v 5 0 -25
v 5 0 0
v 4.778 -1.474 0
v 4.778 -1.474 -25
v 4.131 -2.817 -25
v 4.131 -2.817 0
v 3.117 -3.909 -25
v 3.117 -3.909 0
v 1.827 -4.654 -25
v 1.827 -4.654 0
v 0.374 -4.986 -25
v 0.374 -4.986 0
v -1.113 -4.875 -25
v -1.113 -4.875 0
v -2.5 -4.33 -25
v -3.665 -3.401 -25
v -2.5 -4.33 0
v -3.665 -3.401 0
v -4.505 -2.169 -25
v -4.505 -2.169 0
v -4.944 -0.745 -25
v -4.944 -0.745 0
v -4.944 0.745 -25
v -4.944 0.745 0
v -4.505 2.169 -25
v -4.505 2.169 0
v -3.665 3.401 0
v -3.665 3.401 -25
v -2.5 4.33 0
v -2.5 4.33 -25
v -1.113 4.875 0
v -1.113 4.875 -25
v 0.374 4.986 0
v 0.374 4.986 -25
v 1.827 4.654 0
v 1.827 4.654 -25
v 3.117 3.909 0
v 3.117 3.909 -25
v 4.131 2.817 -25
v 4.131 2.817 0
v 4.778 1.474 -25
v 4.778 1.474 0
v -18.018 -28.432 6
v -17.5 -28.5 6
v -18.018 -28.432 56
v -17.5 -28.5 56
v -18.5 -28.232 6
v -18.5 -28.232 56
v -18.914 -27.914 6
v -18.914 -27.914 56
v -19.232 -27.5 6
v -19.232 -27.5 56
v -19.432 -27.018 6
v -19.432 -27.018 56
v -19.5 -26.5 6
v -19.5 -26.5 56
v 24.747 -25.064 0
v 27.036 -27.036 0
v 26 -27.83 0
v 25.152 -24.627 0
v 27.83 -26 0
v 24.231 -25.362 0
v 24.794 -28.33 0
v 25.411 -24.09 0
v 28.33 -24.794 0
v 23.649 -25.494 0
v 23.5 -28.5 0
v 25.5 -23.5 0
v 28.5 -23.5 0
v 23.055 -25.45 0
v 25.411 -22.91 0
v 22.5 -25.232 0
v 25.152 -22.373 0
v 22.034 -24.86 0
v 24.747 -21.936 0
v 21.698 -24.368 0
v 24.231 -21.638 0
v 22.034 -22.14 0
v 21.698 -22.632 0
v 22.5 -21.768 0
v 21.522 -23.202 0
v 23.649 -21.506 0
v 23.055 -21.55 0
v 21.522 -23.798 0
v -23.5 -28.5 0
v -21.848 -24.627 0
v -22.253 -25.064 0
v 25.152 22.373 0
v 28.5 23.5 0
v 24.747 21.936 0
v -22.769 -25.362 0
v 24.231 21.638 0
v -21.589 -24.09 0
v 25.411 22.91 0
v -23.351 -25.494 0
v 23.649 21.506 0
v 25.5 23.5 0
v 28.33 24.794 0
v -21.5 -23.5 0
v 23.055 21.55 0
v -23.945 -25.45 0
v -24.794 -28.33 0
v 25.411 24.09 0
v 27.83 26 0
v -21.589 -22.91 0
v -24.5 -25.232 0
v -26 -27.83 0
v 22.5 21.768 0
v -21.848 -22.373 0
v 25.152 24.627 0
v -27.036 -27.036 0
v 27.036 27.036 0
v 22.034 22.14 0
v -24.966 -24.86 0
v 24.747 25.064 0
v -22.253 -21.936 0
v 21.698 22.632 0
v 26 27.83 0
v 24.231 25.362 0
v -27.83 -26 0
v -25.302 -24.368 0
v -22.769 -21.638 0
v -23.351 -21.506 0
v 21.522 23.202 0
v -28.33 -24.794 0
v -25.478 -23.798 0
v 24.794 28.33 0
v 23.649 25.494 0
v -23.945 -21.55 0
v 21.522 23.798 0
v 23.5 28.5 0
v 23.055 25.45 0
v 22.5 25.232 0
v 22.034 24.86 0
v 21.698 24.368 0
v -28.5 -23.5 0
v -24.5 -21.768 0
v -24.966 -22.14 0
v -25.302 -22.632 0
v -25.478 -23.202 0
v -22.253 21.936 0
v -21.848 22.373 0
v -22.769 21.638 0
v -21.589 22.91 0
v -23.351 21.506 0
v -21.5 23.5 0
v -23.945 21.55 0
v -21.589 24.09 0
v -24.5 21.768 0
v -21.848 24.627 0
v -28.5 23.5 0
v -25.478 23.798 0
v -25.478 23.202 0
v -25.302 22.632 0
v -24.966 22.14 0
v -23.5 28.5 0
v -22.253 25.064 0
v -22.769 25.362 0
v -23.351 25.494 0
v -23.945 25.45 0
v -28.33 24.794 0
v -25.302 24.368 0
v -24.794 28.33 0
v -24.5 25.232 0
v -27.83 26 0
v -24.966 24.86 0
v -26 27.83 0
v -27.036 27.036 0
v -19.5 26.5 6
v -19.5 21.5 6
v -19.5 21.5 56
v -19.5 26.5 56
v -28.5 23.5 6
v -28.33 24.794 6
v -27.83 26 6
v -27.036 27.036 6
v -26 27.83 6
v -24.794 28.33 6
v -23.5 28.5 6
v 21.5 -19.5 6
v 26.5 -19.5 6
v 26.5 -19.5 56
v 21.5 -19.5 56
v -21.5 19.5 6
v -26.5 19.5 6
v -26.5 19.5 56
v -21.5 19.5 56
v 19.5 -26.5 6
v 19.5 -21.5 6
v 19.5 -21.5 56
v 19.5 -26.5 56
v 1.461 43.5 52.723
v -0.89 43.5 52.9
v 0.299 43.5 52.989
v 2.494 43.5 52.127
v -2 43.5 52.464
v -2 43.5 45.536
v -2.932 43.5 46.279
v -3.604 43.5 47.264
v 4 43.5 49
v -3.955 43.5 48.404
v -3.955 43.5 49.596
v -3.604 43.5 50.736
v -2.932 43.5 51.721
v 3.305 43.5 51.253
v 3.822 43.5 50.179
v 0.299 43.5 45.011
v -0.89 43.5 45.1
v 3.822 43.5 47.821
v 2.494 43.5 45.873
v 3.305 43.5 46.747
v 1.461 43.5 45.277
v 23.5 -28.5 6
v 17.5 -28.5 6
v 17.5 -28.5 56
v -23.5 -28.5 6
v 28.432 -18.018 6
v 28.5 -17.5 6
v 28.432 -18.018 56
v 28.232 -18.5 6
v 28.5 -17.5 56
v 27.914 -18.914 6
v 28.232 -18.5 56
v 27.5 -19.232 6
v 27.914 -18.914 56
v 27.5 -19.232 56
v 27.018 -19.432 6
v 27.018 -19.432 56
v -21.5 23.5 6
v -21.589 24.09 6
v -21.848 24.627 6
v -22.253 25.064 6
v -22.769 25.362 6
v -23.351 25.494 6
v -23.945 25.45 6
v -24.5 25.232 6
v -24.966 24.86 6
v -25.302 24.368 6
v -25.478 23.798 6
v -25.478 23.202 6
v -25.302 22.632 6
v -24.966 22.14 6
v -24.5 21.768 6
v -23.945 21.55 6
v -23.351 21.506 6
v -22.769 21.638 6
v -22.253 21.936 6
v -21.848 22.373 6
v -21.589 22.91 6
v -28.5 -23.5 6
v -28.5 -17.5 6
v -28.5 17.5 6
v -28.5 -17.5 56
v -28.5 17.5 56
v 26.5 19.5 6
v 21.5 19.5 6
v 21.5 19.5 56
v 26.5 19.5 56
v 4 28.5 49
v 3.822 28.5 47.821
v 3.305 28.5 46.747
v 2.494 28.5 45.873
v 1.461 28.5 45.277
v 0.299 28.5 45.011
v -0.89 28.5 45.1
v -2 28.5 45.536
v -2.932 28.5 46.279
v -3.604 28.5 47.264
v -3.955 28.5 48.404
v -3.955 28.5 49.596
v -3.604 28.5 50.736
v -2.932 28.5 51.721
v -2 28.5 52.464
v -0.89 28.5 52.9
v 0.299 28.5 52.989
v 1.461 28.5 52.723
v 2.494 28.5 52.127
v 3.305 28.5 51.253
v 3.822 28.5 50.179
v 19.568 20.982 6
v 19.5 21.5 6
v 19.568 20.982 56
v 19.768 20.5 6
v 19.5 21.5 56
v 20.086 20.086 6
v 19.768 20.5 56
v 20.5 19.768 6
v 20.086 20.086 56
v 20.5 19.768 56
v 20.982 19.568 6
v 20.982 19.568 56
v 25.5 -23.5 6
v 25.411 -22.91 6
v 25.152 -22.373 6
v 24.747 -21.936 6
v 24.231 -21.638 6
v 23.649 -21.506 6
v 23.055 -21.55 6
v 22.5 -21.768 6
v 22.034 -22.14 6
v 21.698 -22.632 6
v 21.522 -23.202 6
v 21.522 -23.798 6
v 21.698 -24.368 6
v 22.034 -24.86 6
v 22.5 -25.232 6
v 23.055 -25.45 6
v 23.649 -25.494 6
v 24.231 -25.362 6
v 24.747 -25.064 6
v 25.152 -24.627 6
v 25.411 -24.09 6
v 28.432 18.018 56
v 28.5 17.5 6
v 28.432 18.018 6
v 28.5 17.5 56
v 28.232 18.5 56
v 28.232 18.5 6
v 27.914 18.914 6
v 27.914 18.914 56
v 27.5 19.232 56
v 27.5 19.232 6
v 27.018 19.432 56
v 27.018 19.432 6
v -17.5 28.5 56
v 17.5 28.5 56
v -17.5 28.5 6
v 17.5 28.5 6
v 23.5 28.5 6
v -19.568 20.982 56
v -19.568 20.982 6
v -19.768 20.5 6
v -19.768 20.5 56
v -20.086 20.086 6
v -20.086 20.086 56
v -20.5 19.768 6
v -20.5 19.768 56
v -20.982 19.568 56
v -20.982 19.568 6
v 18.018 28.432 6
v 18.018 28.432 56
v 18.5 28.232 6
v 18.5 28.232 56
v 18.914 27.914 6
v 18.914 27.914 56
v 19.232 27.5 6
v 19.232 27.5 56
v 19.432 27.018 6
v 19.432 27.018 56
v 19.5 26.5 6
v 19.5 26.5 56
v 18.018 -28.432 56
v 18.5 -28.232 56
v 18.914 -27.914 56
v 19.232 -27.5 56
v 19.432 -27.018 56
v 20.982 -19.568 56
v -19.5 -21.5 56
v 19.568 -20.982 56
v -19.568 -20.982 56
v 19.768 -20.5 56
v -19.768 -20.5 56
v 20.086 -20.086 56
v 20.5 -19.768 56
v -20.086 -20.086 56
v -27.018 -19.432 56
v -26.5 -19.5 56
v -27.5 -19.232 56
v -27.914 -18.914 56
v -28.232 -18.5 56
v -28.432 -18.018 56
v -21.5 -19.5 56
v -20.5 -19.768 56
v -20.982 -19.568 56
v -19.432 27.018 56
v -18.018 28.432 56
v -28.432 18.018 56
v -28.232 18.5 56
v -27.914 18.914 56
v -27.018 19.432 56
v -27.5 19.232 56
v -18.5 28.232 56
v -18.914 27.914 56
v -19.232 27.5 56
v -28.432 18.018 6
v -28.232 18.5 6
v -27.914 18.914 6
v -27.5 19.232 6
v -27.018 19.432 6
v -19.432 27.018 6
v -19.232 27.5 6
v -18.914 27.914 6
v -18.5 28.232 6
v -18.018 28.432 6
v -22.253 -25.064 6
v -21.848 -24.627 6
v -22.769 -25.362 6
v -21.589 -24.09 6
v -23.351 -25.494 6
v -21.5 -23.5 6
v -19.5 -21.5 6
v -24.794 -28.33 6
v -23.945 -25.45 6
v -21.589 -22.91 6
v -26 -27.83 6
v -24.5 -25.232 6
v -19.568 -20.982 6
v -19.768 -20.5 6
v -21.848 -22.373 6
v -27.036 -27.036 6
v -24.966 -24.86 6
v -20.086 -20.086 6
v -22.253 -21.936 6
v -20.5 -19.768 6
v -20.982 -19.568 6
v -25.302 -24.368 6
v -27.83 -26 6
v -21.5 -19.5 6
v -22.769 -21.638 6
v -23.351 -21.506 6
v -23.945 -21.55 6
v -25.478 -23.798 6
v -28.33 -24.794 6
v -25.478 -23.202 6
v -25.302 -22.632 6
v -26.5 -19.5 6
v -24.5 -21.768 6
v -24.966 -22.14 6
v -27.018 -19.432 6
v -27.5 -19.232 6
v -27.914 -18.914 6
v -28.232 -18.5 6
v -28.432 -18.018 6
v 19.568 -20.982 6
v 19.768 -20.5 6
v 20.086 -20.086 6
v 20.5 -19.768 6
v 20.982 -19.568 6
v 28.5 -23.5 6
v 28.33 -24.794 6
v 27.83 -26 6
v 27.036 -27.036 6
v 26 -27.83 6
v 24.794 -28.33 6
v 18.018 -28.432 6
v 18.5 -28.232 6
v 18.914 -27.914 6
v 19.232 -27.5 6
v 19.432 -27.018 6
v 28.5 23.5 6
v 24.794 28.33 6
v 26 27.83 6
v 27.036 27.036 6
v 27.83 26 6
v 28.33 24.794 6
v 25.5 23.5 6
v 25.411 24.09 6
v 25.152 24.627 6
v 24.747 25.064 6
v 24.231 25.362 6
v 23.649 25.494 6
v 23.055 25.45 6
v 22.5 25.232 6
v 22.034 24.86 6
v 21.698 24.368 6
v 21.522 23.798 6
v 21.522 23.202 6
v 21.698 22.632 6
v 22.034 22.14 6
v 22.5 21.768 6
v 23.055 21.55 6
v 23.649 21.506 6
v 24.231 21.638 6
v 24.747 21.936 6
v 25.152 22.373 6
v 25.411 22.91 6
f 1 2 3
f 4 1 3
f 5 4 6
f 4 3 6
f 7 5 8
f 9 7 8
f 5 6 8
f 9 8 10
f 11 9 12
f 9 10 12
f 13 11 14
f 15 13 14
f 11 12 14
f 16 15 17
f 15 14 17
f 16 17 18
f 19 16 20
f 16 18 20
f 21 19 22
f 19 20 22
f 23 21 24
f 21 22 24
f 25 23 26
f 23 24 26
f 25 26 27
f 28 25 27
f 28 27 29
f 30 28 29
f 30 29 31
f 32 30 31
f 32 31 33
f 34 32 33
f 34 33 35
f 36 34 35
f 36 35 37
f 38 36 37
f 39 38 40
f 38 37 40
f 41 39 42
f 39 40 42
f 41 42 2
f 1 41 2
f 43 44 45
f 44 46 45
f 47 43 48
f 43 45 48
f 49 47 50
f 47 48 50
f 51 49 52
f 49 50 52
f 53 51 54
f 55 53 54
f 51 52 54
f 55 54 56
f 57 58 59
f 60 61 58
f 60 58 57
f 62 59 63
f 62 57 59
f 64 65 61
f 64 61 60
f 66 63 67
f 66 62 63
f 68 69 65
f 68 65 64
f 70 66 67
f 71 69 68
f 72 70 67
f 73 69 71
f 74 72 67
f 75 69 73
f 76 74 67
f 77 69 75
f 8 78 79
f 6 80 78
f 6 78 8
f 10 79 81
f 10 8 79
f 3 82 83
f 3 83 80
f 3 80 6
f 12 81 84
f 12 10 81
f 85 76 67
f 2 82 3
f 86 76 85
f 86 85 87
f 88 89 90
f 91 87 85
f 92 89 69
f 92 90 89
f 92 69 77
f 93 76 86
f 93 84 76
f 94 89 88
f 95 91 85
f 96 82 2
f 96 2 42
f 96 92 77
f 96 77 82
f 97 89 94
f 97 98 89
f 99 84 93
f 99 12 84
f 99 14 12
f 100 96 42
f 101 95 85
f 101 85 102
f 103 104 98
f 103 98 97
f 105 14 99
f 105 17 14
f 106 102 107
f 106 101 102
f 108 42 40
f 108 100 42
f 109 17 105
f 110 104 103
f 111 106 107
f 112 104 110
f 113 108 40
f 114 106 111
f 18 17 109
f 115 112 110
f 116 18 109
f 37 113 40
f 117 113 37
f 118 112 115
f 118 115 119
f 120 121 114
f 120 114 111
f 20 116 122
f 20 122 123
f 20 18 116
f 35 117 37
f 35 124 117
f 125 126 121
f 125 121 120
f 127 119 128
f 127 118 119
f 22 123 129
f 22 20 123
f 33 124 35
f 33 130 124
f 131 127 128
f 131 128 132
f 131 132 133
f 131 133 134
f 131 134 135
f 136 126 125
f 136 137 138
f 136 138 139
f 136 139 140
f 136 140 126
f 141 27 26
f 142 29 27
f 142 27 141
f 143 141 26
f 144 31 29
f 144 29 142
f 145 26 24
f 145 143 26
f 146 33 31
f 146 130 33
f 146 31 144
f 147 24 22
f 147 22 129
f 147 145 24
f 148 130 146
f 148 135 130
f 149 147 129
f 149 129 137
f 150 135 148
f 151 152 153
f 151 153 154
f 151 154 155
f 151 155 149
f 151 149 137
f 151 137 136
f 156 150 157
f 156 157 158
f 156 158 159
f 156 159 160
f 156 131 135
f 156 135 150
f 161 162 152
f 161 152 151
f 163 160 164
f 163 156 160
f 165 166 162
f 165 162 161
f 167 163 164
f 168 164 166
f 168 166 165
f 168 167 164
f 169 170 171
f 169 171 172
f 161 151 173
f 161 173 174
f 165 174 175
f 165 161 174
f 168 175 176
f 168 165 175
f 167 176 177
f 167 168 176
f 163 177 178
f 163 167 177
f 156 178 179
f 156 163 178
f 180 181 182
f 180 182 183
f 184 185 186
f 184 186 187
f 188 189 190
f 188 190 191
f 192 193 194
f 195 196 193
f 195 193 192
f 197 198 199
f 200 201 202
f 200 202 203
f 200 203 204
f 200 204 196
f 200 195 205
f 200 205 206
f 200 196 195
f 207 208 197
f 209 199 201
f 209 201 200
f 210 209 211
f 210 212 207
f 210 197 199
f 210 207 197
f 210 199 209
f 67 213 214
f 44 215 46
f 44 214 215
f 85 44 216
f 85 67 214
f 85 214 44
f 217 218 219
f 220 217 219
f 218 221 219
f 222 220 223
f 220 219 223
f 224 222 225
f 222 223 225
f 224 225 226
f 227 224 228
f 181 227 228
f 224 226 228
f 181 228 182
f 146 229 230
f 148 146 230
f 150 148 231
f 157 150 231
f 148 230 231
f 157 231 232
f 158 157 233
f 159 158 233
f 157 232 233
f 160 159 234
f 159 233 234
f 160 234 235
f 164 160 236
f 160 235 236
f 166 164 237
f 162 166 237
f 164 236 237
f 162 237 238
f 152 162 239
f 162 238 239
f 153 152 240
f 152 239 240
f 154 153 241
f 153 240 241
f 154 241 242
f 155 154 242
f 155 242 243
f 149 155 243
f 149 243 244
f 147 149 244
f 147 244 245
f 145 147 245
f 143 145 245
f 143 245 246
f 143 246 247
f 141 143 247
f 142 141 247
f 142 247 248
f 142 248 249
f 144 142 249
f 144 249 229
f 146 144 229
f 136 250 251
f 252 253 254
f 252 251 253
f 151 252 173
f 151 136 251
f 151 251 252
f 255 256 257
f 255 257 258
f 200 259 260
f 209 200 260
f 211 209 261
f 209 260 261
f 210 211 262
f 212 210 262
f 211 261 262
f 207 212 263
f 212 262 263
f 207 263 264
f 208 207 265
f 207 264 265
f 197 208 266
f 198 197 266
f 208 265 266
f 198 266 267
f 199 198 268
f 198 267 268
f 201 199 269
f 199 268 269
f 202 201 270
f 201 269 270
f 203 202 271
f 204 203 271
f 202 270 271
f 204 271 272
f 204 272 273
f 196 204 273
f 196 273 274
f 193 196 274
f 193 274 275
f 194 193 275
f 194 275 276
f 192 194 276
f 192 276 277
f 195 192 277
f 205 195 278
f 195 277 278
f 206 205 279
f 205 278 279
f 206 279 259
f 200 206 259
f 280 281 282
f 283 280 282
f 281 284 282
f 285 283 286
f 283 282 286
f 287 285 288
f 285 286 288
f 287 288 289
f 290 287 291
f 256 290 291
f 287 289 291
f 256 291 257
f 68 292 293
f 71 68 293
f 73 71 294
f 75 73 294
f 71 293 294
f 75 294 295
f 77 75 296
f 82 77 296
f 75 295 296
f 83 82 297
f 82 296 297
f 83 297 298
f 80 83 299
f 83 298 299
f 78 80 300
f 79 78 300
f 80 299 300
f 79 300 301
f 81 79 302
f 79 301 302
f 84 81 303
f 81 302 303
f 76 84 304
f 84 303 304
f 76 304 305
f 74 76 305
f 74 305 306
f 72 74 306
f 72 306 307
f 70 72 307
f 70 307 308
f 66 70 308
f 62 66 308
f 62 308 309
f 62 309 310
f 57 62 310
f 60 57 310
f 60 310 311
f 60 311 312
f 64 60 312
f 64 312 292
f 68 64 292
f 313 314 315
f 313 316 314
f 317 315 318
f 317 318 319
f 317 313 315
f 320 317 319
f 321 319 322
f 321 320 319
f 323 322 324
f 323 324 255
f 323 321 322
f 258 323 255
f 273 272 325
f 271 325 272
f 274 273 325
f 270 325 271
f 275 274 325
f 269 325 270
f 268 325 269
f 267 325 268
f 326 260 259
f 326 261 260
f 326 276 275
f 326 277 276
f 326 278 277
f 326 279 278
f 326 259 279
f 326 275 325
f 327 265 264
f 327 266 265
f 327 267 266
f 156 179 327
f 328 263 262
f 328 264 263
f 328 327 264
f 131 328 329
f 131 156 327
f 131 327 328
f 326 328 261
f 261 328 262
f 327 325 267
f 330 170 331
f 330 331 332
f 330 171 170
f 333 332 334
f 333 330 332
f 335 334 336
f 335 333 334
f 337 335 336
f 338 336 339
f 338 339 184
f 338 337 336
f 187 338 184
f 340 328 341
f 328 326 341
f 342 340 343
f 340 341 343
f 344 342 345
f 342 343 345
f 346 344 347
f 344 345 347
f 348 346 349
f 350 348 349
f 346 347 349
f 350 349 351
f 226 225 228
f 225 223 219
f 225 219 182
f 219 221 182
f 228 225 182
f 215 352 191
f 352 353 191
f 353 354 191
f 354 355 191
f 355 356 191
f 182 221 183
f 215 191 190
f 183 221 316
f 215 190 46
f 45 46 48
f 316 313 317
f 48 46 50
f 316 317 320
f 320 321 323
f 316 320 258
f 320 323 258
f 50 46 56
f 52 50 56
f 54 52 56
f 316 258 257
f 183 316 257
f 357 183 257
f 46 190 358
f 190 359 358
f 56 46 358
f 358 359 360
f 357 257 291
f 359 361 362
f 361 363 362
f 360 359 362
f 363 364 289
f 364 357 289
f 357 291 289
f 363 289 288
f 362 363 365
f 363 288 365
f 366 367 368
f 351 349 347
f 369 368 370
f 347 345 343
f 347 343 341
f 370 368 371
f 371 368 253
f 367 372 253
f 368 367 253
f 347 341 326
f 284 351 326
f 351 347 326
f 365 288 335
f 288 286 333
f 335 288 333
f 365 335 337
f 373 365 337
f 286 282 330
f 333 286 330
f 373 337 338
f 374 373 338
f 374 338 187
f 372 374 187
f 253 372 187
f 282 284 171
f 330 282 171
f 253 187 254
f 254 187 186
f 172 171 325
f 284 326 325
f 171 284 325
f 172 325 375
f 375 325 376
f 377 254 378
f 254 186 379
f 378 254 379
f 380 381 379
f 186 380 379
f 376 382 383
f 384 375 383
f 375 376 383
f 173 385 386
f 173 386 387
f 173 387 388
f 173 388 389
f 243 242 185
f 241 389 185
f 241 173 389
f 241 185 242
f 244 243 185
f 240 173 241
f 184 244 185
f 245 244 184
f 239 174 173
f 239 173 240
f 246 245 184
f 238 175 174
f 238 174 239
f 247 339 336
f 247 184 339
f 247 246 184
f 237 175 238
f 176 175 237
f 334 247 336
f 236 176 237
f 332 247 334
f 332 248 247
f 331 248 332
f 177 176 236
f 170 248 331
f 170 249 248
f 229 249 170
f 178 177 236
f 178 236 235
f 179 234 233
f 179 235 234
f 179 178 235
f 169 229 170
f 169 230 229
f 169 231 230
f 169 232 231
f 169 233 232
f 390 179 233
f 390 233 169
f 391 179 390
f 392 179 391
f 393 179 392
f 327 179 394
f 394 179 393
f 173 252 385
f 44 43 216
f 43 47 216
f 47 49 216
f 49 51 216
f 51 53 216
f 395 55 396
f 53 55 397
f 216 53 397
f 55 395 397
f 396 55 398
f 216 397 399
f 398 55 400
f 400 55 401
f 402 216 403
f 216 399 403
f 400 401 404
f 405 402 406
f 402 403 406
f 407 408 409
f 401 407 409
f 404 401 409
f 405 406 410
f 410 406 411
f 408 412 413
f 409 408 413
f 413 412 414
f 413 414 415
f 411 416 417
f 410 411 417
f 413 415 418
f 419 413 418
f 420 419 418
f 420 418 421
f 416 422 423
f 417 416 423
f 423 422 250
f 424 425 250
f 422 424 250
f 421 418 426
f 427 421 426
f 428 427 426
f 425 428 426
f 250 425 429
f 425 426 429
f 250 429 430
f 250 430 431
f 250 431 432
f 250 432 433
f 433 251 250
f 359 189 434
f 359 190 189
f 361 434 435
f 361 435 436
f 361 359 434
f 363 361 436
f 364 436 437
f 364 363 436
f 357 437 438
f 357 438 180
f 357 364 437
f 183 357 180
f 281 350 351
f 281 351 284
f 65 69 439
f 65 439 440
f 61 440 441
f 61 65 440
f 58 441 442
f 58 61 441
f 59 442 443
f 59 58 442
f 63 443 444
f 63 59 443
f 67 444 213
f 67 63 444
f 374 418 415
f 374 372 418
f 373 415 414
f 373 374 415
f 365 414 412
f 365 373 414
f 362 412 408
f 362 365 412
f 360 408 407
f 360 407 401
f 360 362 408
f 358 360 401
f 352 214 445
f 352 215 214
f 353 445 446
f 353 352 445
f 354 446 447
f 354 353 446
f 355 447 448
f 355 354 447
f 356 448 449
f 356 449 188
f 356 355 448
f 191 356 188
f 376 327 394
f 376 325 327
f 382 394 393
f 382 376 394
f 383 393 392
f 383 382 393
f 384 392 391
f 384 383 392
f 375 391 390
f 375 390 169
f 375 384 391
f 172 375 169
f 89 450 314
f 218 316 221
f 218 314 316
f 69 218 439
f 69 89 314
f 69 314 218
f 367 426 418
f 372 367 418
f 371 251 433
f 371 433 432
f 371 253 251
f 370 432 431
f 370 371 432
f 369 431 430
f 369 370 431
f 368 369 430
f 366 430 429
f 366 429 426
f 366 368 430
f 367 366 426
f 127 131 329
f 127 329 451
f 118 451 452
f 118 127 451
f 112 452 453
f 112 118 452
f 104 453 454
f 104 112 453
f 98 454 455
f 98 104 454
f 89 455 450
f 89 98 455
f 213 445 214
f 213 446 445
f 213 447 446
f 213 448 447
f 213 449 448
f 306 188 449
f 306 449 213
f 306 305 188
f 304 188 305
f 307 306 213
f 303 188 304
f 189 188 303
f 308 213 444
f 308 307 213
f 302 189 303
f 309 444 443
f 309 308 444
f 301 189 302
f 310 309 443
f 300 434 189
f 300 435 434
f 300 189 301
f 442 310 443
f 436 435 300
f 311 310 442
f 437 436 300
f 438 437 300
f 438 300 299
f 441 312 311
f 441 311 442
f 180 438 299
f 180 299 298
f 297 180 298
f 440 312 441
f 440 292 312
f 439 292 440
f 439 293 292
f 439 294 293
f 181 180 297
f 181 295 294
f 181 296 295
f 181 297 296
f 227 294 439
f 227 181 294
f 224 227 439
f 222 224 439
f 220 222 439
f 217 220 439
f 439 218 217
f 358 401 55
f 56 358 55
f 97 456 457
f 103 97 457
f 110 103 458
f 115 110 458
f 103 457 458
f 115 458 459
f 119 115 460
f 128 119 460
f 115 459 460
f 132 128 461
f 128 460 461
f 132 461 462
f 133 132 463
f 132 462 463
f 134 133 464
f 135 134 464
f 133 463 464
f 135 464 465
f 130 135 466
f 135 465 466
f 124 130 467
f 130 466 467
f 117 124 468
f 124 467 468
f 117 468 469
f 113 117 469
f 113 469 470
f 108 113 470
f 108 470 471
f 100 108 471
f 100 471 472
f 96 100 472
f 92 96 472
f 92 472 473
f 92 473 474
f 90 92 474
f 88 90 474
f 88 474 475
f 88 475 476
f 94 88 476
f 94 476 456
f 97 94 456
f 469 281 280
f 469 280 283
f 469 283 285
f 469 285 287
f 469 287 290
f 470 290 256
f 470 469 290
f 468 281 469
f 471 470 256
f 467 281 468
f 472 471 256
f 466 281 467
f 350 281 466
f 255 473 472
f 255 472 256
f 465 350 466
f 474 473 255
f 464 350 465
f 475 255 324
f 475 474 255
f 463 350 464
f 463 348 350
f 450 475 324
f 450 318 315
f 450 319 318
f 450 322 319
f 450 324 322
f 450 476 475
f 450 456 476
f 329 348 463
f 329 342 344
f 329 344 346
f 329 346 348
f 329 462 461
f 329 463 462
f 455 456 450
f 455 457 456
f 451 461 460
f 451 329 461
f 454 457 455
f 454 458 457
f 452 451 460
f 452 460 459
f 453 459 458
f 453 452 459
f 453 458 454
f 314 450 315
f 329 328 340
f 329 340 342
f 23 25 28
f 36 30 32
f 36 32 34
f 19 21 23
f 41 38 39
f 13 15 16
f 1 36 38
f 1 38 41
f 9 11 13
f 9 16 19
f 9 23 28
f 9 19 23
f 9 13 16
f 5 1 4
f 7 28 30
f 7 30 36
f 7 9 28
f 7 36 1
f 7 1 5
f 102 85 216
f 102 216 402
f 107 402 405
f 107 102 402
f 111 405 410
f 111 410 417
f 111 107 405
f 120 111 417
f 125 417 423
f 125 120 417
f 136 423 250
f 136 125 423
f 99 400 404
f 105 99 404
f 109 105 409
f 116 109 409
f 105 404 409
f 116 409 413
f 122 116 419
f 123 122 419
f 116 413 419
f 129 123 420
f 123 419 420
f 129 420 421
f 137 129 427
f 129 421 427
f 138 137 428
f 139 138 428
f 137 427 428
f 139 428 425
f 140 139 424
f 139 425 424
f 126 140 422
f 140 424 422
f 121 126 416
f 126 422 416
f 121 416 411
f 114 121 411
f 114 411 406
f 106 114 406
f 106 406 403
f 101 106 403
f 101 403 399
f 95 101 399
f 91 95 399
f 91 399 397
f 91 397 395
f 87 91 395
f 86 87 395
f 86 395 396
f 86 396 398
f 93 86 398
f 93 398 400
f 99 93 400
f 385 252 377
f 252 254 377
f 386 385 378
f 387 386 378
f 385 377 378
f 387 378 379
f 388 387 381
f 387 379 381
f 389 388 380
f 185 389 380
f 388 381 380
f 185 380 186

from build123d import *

# Parameters (mm, degrees)
EXTRUDE_1_DEPTH     = 56
CUT_EXTRUDE_START   = -50
CUT_EXTRUDE_1_DEPTH = 50
FILLET_1_R          = 2
SKETCH_3_R          = 2
CUT_EXTRUDE_2_DEPTH = 65.222270281
SKETCH_4_R          = 5
EXTRUDE_2_DEPTH     = 25
SKETCH_5_R          = 4
EXTRUDE_3_DEPTH     = 15


with BuildPart() as part:
    # 草图1 → 凸台-拉伸1 (new body)
    with BuildSketch(Plane.XY):
        with BuildLine():
            Line((-23.5, 28.5), (23.5, 28.5))
            ThreePointArc((23.5, 28.5), (27.035533906, 27.035533906), (28.5, 23.5))
            Line((28.5, 23.5), (28.5, -23.5))
            ThreePointArc((28.5, -23.5), (27.035533906, -27.035533906), (23.5, -28.5))
            Line((23.5, -28.5), (-23.5, -28.5))
            ThreePointArc((-23.5, -28.5), (-27.035533906, -27.035533906), (-28.5, -23.5))
            Line((-28.5, -23.5), (-28.5, 23.5))
            ThreePointArc((-28.5, 23.5), (-27.035533906, 27.035533906), (-23.5, 28.5))
        make_face()
    extrude(amount=EXTRUDE_1_DEPTH)

    # 草图2 → 切除-拉伸1 (cut)
    with BuildSketch(Plane.XY.offset(56).offset(CUT_EXTRUDE_START)):
        with BuildLine():
            Line((-28.5, -19.5), (-19.5, -19.5))
            Line((-19.5, -19.5), (-19.5, -28.5))
            Line((-19.5, -28.5), (-23.5, -28.5))
            ThreePointArc((-23.5, -28.5), (-27.035533906, -27.035533906), (-28.5, -23.5))
            Line((-28.5, -23.5), (-28.5, -19.5))
        make_face()
        with BuildLine():
            Line((-28.5, 19.5), (-19.5, 19.5))
            Line((-19.5, 19.5), (-19.5, 28.5))
            Line((-19.5, 28.5), (-23.5, 28.5))
            ThreePointArc((-23.5, 28.5), (-27.035533906, 27.035533906), (-28.5, 23.5))
            Line((-28.5, 23.5), (-28.5, 19.5))
        make_face()
        with BuildLine():
            Line((23.5, 28.5), (19.5, 28.5))
            Line((19.5, 28.5), (19.5, 19.5))
            Line((19.5, 19.5), (28.5, 19.5))
            Line((28.5, 19.5), (28.5, 23.5))
            ThreePointArc((28.5, 23.5), (27.035533906, 27.035533906), (23.5, 28.5))
        make_face()
        with BuildLine():
            Line((28.5, -23.5), (28.5, -19.5))
            Line((28.5, -19.5), (19.5, -19.5))
            Line((19.5, -19.5), (19.5, -28.5))
            Line((19.5, -28.5), (23.5, -28.5))
            ThreePointArc((23.5, -28.5), (27.035533906, -27.035533906), (28.5, -23.5))
        make_face()
    extrude(amount=CUT_EXTRUDE_1_DEPTH, mode=Mode.SUBTRACT)

    # 圆角1
    fillet_1_edges = [part.edges().sort_by_distance(p)[0] for p in [
        (19.5, -28.5, 31),
        (19.5, -19.5, 31),
        (28.5, -19.5, 31),
        (-19.5, 28.5, 31),
        (-19.5, 19.5, 31),
        (-28.5, 19.5, 31),
        (28.5, 19.5, 31),
        (19.5, 19.5, 31),
        (19.5, 28.5, 31),
        (-28.5, -19.5, 31),
        (-19.5, -19.5, 31),
        (-19.5, -28.5, 31),
    ]]
    fillet(fillet_1_edges, radius=FILLET_1_R)

    # 草图3 → 切除-拉伸2 (cut, through all)
    with BuildSketch(Plane.XY.offset(6)):
        with Locations((-23.5, -23.5)):
            Circle(SKETCH_3_R)
        with Locations((-23.5, 23.5)):
            Circle(SKETCH_3_R)
        with Locations((23.5, 23.5)):
            Circle(SKETCH_3_R)
        with Locations((23.5, -23.5)):
            Circle(SKETCH_3_R)
    extrude(amount=-CUT_EXTRUDE_2_DEPTH, mode=Mode.SUBTRACT)

    # 草图4 → 凸台-拉伸2 (add)
    with BuildSketch(Plane(origin=(0, 0, 0), x_dir=(-1, 0, 0), z_dir=(0, 0, -1))):
        with Locations(Location((0, 0, 0), (0, 0, 180))):
            Circle(SKETCH_4_R)
    extrude(amount=EXTRUDE_2_DEPTH)

    # 草图5 → 凸台-拉伸3 (add)
    with BuildSketch(Plane(origin=(0, 28.5, 0), x_dir=(1, 0, 0), z_dir=(0, 1, 0))):
        with Locations((0, -49)):
            Circle(SKETCH_5_R)
    extrude(amount=EXTRUDE_3_DEPTH)


solid = part.part
